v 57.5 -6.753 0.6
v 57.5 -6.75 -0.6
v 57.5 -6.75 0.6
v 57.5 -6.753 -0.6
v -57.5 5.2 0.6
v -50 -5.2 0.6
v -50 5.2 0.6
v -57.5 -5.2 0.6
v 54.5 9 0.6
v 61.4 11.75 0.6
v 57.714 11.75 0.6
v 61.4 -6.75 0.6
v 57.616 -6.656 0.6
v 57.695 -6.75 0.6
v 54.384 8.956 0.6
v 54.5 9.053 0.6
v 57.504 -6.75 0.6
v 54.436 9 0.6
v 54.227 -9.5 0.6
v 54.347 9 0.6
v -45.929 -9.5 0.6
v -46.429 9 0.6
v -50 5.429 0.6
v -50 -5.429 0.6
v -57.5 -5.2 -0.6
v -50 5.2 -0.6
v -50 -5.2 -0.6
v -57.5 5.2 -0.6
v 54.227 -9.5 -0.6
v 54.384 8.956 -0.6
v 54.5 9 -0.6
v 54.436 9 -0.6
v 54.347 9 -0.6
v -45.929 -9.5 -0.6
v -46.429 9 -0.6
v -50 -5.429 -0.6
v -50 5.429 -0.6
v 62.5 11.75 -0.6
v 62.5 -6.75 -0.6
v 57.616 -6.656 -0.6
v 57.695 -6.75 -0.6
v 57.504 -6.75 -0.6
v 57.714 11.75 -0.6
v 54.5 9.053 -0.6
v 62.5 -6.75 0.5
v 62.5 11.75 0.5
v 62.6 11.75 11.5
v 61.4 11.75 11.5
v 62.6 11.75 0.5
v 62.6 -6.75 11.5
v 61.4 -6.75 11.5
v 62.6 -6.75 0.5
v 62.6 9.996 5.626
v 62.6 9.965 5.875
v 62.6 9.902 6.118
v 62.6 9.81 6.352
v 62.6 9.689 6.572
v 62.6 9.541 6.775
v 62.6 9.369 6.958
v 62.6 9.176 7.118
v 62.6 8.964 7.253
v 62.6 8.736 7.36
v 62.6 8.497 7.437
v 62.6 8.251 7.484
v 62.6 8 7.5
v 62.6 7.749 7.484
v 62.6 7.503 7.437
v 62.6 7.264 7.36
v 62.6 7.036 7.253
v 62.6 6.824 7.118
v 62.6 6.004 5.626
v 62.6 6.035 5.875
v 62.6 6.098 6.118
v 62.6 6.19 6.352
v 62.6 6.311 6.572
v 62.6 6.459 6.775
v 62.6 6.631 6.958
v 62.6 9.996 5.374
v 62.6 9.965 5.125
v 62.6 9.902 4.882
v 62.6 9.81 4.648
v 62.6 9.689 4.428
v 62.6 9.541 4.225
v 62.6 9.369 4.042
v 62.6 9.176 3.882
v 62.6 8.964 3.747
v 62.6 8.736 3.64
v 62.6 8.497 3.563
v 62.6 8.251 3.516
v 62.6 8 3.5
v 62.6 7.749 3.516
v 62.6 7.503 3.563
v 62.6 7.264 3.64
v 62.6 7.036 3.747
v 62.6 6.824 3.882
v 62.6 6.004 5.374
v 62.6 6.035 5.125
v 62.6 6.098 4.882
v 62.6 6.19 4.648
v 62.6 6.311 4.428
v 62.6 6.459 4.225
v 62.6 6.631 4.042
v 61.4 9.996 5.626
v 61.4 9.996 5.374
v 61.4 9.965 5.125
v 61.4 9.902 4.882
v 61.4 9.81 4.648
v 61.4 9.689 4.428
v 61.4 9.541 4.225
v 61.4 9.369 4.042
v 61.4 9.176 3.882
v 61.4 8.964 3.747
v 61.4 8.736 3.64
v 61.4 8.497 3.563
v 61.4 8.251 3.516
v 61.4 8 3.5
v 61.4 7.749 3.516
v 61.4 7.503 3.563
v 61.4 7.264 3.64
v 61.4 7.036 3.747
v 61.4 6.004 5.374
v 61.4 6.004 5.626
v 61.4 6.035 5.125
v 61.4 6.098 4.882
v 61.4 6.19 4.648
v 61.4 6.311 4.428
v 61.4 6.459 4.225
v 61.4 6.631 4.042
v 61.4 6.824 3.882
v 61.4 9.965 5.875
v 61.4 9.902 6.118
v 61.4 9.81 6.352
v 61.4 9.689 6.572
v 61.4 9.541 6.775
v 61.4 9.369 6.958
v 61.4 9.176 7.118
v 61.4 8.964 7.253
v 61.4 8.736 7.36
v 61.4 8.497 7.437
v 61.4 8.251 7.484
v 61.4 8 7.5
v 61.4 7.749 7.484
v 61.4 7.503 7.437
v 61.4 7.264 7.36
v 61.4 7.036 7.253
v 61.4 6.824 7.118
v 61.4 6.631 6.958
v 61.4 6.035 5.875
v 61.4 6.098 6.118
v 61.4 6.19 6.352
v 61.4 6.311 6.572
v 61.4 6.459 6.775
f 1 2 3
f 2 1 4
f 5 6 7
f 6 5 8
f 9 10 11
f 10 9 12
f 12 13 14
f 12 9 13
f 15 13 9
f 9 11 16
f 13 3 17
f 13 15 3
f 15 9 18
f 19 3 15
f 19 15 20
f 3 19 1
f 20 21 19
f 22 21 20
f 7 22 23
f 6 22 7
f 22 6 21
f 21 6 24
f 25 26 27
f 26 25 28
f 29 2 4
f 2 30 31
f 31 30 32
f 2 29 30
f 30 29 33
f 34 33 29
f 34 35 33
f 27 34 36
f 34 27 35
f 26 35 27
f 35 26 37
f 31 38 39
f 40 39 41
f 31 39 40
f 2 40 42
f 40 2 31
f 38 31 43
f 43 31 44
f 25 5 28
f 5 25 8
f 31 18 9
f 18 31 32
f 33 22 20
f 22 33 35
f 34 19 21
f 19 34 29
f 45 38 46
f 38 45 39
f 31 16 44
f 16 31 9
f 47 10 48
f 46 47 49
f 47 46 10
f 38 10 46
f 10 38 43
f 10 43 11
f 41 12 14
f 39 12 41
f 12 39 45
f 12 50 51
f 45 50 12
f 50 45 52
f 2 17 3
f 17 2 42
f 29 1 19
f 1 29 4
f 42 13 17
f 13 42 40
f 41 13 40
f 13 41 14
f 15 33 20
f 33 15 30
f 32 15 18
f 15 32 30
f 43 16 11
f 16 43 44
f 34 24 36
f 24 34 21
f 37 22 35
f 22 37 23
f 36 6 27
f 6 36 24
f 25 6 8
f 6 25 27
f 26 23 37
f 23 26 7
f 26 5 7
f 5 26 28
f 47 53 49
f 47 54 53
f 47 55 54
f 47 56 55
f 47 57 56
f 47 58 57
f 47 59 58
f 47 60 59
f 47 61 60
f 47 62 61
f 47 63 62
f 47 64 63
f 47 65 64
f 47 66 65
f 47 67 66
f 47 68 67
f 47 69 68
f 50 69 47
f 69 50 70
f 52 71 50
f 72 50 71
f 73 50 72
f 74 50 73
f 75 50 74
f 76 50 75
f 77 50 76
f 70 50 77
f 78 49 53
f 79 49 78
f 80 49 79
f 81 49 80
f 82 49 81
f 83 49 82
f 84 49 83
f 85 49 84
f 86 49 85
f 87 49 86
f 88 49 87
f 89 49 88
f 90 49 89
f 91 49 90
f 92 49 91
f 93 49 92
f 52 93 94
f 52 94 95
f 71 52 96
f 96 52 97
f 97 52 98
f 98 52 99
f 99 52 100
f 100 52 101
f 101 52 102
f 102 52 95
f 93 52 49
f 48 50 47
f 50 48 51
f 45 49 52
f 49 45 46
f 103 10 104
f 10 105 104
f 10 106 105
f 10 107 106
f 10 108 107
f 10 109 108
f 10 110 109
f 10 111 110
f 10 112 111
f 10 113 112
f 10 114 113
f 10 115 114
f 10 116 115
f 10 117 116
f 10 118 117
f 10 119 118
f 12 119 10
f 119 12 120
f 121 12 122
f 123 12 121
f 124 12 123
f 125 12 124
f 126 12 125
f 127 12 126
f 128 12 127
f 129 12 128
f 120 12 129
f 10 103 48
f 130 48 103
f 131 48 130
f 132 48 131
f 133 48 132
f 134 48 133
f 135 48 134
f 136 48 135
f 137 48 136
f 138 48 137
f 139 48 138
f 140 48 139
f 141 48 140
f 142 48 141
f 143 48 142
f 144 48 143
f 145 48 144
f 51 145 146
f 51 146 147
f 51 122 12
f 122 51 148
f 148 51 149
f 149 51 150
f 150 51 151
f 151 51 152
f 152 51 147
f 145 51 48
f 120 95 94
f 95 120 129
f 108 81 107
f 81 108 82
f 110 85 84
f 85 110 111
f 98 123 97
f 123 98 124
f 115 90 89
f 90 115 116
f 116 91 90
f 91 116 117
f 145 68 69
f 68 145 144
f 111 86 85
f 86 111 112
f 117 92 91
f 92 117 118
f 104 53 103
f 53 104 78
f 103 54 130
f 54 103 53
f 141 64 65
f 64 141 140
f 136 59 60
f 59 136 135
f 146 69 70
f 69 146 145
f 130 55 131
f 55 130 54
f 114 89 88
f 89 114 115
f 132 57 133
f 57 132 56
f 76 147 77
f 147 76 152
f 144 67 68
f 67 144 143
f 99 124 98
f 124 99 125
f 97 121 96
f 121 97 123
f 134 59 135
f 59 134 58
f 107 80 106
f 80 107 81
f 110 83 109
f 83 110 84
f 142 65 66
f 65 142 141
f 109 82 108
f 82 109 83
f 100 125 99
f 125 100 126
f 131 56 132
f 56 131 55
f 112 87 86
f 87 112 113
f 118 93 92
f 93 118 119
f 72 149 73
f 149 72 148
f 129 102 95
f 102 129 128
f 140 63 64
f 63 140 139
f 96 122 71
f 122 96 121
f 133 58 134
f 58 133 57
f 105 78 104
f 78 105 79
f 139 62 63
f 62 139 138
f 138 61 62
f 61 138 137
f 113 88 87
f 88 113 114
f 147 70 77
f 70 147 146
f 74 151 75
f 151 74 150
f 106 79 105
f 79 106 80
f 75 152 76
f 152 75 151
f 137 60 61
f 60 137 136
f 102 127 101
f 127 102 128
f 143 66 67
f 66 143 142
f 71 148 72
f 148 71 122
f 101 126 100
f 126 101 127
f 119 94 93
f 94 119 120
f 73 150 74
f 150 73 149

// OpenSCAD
thickness=1.2;

module pci_bracket() {
union() {
difference() {
union () {
translate([0,-0.25,0]) cube([115,18.5,thickness],center=true);
translate([58.5,2.5,0]) cube([8,18.5,thickness],center=true);
}
translate([57,-13.7,0]) rotate([0,0,40]) cube([10,10,10],center=true);
translate([55,16,0]) rotate([0,0,40]) cube([10,10,10],center=true);
translate([-50,-12.5,0]) rotate([0,0,45]) cube([10,10,10],center=true);
translate([-50,12.5,0]) rotate([0,0,45]) cube([10,10,10],center=true);
translate([-55,-10.2,0]) cube([10,10,10],center=true);
translate([-55,10.2,0]) cube([10,10,10],center=true);
}
difference() {
translate([62,2.5,6]) cube([thickness,18.5,11],center=true);
// inlet cut from edge to half-circle
if(0) // print unfriendly
translate([62,10.75,5.5]) cube([2,6,4],center=true);
// helf-circle
translate([62,8,5.5]) rotate([0,90,0]) cylinder(r=2,h=2,center=true);
}
}
}

module vga_hole() { //28 long
translate([12.5,0,0]) cylinder(r=1.5,h=10,center=true);
translate([-12.5,0,0]) cylinder(r=1.5,h=10,center=true);
cube([19,11,10],center=true);
}

module dvi_hole() { //36 long
union() {
translate([16.5,0,0]) cylinder(r=1.5,h=10,center=true);
translate([-16.5,0,0]) cylinder(r=1.5,h=10,center=true);
cube([24.5,9,10],center=true);
}
}

difference() {
pci_bracket();
if(0)
translate([-30,0,0]) {
//translate([35,1,0]) {
 vga_hole();
 if(0)
 translate([60,0,0]) {
// translate([-41,-2,0]) {
  dvi_hole();
  }
 }
}

$fn=50;
